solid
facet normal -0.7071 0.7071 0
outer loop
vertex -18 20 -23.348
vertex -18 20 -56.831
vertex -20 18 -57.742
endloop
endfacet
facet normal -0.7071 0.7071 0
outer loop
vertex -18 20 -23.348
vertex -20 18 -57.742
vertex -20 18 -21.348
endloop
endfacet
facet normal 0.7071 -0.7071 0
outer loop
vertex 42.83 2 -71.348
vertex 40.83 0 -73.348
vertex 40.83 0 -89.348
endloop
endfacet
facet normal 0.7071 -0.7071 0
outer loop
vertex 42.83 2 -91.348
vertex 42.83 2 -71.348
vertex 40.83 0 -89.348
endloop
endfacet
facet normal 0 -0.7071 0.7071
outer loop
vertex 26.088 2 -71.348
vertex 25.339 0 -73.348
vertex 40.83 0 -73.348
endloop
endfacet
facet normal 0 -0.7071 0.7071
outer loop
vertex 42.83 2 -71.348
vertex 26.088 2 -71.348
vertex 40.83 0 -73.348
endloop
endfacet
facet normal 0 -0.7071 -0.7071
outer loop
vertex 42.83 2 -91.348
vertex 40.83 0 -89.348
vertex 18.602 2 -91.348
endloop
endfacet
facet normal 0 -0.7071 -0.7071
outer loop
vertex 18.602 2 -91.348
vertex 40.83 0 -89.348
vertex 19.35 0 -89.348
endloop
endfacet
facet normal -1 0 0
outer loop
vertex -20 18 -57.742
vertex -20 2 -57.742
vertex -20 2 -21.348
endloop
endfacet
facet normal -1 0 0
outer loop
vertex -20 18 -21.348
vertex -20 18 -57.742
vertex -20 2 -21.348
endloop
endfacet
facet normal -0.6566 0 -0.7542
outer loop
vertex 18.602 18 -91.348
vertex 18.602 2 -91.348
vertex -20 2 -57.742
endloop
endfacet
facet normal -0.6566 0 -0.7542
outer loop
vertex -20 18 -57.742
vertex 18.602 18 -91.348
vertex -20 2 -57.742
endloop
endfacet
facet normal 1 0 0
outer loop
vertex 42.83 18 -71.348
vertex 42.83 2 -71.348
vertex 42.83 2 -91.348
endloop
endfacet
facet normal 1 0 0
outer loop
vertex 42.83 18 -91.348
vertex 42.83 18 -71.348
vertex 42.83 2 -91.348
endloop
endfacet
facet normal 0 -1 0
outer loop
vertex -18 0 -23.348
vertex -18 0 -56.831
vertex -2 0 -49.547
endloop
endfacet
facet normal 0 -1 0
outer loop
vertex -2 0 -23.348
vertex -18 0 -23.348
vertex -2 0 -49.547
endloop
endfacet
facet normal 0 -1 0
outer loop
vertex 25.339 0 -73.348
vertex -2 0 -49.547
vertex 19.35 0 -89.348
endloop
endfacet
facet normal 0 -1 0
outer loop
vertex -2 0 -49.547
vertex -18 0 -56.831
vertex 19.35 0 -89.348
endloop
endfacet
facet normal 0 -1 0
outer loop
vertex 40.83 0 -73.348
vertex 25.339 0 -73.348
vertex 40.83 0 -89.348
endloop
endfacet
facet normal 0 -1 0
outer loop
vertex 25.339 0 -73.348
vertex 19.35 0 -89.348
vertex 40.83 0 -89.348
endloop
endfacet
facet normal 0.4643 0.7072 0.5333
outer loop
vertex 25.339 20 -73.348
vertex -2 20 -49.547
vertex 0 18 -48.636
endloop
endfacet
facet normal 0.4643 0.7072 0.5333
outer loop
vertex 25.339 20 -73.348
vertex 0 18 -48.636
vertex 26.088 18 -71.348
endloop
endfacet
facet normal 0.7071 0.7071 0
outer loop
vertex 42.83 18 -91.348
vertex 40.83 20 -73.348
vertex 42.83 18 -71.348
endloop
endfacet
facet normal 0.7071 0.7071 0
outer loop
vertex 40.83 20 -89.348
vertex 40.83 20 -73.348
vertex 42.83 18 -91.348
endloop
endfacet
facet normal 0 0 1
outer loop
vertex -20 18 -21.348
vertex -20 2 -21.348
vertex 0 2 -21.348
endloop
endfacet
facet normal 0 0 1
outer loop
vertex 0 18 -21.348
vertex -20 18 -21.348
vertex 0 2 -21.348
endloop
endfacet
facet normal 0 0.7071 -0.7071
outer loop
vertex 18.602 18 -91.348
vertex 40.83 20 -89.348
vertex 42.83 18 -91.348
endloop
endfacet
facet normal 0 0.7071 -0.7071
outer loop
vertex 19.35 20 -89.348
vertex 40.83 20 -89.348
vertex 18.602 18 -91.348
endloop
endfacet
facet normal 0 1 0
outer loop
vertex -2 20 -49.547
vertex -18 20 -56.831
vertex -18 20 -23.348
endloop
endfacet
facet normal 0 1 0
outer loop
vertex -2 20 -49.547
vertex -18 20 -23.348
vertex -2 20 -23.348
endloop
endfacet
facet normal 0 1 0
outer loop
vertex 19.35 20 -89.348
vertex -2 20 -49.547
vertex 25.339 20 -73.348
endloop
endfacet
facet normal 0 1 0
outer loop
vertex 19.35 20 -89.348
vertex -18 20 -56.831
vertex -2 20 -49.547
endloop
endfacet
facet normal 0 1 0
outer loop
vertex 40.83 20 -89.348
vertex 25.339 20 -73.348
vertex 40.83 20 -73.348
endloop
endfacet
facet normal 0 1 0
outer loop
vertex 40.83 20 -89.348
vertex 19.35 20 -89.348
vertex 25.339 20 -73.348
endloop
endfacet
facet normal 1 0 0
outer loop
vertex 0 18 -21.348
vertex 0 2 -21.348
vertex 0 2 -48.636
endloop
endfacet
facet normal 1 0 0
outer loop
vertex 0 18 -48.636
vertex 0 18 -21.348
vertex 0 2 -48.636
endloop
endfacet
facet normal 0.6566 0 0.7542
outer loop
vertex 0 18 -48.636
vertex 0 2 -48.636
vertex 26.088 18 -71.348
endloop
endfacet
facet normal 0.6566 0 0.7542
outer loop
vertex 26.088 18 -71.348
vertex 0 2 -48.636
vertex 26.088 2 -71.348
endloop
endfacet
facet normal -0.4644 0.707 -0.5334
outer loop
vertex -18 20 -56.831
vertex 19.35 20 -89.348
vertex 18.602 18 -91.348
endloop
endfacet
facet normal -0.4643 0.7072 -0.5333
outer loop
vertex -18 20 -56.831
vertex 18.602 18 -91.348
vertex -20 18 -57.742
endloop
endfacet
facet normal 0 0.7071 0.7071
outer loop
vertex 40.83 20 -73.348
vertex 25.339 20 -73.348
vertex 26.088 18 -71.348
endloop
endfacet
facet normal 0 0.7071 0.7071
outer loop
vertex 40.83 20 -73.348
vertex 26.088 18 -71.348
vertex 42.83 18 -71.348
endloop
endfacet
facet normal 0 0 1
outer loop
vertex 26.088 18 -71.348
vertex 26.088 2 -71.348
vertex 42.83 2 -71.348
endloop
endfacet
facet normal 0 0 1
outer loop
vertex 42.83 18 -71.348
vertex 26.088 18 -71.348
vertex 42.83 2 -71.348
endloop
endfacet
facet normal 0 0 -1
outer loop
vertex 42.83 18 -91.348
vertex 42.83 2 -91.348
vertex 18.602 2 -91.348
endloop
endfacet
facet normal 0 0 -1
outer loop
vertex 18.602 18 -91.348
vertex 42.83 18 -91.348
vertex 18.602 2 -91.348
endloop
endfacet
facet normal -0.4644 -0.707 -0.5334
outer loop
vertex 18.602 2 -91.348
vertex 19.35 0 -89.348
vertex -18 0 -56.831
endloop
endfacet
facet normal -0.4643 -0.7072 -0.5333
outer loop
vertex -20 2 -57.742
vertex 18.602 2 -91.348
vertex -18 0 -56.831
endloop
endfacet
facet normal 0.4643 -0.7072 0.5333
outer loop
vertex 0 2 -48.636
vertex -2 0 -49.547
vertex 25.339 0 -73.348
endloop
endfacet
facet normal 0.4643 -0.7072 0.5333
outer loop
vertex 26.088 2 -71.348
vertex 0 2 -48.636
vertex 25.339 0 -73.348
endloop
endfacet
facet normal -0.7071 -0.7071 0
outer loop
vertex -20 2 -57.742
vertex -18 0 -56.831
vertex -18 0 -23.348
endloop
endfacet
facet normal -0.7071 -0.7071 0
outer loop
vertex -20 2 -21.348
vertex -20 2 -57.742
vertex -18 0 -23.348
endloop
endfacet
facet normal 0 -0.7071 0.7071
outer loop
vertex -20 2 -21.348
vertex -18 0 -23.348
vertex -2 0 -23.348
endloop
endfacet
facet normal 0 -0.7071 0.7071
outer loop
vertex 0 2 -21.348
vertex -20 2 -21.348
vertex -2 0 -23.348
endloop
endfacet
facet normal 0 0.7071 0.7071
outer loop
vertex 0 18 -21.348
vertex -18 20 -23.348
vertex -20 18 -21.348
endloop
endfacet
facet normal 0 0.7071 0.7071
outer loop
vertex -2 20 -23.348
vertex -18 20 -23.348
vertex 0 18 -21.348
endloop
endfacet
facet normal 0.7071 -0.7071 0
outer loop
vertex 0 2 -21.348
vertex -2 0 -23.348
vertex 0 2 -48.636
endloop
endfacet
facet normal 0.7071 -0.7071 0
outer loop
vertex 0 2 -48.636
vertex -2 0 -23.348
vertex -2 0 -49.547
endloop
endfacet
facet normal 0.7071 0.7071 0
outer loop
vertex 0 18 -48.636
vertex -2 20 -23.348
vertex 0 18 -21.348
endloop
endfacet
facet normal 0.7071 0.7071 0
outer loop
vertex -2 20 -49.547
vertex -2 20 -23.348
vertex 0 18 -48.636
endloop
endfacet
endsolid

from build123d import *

# Parameters (mm, degrees)
BOSS_EXTRUDE1_DEPTH = 20
CHAMFER1_SIZE       = 2


with BuildPart() as part:
    # Sketch1 → Boss-Extrude1 (new body)
    with BuildSketch(Plane(origin=(0, 0, 0), x_dir=(1, 0, 0), z_dir=(0, 1, 0))):
        Polygon((42.830428459, 91.348139701), (18.601676139, 91.348139701), (-20, 57.741800753), (-20, 21.348139701), (0, 21.348139701), (0, 48.636252059), (26.0878441, 71.348139701), (42.830428459, 71.348139701), align=None)
    extrude(amount=BOSS_EXTRUDE1_DEPTH)

    # Chamfer1
    chamfer1_edges = [part.edges().sort_by_distance(p)[0] for p in [
        (-20, 0, -39.544970227),
        (-0.699161931, 0, -74.544970227),
        (30.716052299, 0, -91.348139701),
        (42.830428459, 0, -81.348139701),
        (-0.699161931, 20, -74.544970227),
        (-20, 20, -39.544970227),
        (-10, 20, -21.348139701),
        (0, 20, -34.99219588),
        (13.04392205, 20, -59.99219588),
        (34.459136279, 20, -71.348139701),
        (42.830428459, 20, -81.348139701),
        (34.459136279, 0, -71.348139701),
        (30.716052299, 20, -91.348139701),
        (13.04392205, 0, -59.99219588),
        (0, 0, -34.99219588),
        (-10, 0, -21.348139701),
    ]]
    chamfer(chamfer1_edges, length=CHAMFER1_SIZE)


solid = part.part
